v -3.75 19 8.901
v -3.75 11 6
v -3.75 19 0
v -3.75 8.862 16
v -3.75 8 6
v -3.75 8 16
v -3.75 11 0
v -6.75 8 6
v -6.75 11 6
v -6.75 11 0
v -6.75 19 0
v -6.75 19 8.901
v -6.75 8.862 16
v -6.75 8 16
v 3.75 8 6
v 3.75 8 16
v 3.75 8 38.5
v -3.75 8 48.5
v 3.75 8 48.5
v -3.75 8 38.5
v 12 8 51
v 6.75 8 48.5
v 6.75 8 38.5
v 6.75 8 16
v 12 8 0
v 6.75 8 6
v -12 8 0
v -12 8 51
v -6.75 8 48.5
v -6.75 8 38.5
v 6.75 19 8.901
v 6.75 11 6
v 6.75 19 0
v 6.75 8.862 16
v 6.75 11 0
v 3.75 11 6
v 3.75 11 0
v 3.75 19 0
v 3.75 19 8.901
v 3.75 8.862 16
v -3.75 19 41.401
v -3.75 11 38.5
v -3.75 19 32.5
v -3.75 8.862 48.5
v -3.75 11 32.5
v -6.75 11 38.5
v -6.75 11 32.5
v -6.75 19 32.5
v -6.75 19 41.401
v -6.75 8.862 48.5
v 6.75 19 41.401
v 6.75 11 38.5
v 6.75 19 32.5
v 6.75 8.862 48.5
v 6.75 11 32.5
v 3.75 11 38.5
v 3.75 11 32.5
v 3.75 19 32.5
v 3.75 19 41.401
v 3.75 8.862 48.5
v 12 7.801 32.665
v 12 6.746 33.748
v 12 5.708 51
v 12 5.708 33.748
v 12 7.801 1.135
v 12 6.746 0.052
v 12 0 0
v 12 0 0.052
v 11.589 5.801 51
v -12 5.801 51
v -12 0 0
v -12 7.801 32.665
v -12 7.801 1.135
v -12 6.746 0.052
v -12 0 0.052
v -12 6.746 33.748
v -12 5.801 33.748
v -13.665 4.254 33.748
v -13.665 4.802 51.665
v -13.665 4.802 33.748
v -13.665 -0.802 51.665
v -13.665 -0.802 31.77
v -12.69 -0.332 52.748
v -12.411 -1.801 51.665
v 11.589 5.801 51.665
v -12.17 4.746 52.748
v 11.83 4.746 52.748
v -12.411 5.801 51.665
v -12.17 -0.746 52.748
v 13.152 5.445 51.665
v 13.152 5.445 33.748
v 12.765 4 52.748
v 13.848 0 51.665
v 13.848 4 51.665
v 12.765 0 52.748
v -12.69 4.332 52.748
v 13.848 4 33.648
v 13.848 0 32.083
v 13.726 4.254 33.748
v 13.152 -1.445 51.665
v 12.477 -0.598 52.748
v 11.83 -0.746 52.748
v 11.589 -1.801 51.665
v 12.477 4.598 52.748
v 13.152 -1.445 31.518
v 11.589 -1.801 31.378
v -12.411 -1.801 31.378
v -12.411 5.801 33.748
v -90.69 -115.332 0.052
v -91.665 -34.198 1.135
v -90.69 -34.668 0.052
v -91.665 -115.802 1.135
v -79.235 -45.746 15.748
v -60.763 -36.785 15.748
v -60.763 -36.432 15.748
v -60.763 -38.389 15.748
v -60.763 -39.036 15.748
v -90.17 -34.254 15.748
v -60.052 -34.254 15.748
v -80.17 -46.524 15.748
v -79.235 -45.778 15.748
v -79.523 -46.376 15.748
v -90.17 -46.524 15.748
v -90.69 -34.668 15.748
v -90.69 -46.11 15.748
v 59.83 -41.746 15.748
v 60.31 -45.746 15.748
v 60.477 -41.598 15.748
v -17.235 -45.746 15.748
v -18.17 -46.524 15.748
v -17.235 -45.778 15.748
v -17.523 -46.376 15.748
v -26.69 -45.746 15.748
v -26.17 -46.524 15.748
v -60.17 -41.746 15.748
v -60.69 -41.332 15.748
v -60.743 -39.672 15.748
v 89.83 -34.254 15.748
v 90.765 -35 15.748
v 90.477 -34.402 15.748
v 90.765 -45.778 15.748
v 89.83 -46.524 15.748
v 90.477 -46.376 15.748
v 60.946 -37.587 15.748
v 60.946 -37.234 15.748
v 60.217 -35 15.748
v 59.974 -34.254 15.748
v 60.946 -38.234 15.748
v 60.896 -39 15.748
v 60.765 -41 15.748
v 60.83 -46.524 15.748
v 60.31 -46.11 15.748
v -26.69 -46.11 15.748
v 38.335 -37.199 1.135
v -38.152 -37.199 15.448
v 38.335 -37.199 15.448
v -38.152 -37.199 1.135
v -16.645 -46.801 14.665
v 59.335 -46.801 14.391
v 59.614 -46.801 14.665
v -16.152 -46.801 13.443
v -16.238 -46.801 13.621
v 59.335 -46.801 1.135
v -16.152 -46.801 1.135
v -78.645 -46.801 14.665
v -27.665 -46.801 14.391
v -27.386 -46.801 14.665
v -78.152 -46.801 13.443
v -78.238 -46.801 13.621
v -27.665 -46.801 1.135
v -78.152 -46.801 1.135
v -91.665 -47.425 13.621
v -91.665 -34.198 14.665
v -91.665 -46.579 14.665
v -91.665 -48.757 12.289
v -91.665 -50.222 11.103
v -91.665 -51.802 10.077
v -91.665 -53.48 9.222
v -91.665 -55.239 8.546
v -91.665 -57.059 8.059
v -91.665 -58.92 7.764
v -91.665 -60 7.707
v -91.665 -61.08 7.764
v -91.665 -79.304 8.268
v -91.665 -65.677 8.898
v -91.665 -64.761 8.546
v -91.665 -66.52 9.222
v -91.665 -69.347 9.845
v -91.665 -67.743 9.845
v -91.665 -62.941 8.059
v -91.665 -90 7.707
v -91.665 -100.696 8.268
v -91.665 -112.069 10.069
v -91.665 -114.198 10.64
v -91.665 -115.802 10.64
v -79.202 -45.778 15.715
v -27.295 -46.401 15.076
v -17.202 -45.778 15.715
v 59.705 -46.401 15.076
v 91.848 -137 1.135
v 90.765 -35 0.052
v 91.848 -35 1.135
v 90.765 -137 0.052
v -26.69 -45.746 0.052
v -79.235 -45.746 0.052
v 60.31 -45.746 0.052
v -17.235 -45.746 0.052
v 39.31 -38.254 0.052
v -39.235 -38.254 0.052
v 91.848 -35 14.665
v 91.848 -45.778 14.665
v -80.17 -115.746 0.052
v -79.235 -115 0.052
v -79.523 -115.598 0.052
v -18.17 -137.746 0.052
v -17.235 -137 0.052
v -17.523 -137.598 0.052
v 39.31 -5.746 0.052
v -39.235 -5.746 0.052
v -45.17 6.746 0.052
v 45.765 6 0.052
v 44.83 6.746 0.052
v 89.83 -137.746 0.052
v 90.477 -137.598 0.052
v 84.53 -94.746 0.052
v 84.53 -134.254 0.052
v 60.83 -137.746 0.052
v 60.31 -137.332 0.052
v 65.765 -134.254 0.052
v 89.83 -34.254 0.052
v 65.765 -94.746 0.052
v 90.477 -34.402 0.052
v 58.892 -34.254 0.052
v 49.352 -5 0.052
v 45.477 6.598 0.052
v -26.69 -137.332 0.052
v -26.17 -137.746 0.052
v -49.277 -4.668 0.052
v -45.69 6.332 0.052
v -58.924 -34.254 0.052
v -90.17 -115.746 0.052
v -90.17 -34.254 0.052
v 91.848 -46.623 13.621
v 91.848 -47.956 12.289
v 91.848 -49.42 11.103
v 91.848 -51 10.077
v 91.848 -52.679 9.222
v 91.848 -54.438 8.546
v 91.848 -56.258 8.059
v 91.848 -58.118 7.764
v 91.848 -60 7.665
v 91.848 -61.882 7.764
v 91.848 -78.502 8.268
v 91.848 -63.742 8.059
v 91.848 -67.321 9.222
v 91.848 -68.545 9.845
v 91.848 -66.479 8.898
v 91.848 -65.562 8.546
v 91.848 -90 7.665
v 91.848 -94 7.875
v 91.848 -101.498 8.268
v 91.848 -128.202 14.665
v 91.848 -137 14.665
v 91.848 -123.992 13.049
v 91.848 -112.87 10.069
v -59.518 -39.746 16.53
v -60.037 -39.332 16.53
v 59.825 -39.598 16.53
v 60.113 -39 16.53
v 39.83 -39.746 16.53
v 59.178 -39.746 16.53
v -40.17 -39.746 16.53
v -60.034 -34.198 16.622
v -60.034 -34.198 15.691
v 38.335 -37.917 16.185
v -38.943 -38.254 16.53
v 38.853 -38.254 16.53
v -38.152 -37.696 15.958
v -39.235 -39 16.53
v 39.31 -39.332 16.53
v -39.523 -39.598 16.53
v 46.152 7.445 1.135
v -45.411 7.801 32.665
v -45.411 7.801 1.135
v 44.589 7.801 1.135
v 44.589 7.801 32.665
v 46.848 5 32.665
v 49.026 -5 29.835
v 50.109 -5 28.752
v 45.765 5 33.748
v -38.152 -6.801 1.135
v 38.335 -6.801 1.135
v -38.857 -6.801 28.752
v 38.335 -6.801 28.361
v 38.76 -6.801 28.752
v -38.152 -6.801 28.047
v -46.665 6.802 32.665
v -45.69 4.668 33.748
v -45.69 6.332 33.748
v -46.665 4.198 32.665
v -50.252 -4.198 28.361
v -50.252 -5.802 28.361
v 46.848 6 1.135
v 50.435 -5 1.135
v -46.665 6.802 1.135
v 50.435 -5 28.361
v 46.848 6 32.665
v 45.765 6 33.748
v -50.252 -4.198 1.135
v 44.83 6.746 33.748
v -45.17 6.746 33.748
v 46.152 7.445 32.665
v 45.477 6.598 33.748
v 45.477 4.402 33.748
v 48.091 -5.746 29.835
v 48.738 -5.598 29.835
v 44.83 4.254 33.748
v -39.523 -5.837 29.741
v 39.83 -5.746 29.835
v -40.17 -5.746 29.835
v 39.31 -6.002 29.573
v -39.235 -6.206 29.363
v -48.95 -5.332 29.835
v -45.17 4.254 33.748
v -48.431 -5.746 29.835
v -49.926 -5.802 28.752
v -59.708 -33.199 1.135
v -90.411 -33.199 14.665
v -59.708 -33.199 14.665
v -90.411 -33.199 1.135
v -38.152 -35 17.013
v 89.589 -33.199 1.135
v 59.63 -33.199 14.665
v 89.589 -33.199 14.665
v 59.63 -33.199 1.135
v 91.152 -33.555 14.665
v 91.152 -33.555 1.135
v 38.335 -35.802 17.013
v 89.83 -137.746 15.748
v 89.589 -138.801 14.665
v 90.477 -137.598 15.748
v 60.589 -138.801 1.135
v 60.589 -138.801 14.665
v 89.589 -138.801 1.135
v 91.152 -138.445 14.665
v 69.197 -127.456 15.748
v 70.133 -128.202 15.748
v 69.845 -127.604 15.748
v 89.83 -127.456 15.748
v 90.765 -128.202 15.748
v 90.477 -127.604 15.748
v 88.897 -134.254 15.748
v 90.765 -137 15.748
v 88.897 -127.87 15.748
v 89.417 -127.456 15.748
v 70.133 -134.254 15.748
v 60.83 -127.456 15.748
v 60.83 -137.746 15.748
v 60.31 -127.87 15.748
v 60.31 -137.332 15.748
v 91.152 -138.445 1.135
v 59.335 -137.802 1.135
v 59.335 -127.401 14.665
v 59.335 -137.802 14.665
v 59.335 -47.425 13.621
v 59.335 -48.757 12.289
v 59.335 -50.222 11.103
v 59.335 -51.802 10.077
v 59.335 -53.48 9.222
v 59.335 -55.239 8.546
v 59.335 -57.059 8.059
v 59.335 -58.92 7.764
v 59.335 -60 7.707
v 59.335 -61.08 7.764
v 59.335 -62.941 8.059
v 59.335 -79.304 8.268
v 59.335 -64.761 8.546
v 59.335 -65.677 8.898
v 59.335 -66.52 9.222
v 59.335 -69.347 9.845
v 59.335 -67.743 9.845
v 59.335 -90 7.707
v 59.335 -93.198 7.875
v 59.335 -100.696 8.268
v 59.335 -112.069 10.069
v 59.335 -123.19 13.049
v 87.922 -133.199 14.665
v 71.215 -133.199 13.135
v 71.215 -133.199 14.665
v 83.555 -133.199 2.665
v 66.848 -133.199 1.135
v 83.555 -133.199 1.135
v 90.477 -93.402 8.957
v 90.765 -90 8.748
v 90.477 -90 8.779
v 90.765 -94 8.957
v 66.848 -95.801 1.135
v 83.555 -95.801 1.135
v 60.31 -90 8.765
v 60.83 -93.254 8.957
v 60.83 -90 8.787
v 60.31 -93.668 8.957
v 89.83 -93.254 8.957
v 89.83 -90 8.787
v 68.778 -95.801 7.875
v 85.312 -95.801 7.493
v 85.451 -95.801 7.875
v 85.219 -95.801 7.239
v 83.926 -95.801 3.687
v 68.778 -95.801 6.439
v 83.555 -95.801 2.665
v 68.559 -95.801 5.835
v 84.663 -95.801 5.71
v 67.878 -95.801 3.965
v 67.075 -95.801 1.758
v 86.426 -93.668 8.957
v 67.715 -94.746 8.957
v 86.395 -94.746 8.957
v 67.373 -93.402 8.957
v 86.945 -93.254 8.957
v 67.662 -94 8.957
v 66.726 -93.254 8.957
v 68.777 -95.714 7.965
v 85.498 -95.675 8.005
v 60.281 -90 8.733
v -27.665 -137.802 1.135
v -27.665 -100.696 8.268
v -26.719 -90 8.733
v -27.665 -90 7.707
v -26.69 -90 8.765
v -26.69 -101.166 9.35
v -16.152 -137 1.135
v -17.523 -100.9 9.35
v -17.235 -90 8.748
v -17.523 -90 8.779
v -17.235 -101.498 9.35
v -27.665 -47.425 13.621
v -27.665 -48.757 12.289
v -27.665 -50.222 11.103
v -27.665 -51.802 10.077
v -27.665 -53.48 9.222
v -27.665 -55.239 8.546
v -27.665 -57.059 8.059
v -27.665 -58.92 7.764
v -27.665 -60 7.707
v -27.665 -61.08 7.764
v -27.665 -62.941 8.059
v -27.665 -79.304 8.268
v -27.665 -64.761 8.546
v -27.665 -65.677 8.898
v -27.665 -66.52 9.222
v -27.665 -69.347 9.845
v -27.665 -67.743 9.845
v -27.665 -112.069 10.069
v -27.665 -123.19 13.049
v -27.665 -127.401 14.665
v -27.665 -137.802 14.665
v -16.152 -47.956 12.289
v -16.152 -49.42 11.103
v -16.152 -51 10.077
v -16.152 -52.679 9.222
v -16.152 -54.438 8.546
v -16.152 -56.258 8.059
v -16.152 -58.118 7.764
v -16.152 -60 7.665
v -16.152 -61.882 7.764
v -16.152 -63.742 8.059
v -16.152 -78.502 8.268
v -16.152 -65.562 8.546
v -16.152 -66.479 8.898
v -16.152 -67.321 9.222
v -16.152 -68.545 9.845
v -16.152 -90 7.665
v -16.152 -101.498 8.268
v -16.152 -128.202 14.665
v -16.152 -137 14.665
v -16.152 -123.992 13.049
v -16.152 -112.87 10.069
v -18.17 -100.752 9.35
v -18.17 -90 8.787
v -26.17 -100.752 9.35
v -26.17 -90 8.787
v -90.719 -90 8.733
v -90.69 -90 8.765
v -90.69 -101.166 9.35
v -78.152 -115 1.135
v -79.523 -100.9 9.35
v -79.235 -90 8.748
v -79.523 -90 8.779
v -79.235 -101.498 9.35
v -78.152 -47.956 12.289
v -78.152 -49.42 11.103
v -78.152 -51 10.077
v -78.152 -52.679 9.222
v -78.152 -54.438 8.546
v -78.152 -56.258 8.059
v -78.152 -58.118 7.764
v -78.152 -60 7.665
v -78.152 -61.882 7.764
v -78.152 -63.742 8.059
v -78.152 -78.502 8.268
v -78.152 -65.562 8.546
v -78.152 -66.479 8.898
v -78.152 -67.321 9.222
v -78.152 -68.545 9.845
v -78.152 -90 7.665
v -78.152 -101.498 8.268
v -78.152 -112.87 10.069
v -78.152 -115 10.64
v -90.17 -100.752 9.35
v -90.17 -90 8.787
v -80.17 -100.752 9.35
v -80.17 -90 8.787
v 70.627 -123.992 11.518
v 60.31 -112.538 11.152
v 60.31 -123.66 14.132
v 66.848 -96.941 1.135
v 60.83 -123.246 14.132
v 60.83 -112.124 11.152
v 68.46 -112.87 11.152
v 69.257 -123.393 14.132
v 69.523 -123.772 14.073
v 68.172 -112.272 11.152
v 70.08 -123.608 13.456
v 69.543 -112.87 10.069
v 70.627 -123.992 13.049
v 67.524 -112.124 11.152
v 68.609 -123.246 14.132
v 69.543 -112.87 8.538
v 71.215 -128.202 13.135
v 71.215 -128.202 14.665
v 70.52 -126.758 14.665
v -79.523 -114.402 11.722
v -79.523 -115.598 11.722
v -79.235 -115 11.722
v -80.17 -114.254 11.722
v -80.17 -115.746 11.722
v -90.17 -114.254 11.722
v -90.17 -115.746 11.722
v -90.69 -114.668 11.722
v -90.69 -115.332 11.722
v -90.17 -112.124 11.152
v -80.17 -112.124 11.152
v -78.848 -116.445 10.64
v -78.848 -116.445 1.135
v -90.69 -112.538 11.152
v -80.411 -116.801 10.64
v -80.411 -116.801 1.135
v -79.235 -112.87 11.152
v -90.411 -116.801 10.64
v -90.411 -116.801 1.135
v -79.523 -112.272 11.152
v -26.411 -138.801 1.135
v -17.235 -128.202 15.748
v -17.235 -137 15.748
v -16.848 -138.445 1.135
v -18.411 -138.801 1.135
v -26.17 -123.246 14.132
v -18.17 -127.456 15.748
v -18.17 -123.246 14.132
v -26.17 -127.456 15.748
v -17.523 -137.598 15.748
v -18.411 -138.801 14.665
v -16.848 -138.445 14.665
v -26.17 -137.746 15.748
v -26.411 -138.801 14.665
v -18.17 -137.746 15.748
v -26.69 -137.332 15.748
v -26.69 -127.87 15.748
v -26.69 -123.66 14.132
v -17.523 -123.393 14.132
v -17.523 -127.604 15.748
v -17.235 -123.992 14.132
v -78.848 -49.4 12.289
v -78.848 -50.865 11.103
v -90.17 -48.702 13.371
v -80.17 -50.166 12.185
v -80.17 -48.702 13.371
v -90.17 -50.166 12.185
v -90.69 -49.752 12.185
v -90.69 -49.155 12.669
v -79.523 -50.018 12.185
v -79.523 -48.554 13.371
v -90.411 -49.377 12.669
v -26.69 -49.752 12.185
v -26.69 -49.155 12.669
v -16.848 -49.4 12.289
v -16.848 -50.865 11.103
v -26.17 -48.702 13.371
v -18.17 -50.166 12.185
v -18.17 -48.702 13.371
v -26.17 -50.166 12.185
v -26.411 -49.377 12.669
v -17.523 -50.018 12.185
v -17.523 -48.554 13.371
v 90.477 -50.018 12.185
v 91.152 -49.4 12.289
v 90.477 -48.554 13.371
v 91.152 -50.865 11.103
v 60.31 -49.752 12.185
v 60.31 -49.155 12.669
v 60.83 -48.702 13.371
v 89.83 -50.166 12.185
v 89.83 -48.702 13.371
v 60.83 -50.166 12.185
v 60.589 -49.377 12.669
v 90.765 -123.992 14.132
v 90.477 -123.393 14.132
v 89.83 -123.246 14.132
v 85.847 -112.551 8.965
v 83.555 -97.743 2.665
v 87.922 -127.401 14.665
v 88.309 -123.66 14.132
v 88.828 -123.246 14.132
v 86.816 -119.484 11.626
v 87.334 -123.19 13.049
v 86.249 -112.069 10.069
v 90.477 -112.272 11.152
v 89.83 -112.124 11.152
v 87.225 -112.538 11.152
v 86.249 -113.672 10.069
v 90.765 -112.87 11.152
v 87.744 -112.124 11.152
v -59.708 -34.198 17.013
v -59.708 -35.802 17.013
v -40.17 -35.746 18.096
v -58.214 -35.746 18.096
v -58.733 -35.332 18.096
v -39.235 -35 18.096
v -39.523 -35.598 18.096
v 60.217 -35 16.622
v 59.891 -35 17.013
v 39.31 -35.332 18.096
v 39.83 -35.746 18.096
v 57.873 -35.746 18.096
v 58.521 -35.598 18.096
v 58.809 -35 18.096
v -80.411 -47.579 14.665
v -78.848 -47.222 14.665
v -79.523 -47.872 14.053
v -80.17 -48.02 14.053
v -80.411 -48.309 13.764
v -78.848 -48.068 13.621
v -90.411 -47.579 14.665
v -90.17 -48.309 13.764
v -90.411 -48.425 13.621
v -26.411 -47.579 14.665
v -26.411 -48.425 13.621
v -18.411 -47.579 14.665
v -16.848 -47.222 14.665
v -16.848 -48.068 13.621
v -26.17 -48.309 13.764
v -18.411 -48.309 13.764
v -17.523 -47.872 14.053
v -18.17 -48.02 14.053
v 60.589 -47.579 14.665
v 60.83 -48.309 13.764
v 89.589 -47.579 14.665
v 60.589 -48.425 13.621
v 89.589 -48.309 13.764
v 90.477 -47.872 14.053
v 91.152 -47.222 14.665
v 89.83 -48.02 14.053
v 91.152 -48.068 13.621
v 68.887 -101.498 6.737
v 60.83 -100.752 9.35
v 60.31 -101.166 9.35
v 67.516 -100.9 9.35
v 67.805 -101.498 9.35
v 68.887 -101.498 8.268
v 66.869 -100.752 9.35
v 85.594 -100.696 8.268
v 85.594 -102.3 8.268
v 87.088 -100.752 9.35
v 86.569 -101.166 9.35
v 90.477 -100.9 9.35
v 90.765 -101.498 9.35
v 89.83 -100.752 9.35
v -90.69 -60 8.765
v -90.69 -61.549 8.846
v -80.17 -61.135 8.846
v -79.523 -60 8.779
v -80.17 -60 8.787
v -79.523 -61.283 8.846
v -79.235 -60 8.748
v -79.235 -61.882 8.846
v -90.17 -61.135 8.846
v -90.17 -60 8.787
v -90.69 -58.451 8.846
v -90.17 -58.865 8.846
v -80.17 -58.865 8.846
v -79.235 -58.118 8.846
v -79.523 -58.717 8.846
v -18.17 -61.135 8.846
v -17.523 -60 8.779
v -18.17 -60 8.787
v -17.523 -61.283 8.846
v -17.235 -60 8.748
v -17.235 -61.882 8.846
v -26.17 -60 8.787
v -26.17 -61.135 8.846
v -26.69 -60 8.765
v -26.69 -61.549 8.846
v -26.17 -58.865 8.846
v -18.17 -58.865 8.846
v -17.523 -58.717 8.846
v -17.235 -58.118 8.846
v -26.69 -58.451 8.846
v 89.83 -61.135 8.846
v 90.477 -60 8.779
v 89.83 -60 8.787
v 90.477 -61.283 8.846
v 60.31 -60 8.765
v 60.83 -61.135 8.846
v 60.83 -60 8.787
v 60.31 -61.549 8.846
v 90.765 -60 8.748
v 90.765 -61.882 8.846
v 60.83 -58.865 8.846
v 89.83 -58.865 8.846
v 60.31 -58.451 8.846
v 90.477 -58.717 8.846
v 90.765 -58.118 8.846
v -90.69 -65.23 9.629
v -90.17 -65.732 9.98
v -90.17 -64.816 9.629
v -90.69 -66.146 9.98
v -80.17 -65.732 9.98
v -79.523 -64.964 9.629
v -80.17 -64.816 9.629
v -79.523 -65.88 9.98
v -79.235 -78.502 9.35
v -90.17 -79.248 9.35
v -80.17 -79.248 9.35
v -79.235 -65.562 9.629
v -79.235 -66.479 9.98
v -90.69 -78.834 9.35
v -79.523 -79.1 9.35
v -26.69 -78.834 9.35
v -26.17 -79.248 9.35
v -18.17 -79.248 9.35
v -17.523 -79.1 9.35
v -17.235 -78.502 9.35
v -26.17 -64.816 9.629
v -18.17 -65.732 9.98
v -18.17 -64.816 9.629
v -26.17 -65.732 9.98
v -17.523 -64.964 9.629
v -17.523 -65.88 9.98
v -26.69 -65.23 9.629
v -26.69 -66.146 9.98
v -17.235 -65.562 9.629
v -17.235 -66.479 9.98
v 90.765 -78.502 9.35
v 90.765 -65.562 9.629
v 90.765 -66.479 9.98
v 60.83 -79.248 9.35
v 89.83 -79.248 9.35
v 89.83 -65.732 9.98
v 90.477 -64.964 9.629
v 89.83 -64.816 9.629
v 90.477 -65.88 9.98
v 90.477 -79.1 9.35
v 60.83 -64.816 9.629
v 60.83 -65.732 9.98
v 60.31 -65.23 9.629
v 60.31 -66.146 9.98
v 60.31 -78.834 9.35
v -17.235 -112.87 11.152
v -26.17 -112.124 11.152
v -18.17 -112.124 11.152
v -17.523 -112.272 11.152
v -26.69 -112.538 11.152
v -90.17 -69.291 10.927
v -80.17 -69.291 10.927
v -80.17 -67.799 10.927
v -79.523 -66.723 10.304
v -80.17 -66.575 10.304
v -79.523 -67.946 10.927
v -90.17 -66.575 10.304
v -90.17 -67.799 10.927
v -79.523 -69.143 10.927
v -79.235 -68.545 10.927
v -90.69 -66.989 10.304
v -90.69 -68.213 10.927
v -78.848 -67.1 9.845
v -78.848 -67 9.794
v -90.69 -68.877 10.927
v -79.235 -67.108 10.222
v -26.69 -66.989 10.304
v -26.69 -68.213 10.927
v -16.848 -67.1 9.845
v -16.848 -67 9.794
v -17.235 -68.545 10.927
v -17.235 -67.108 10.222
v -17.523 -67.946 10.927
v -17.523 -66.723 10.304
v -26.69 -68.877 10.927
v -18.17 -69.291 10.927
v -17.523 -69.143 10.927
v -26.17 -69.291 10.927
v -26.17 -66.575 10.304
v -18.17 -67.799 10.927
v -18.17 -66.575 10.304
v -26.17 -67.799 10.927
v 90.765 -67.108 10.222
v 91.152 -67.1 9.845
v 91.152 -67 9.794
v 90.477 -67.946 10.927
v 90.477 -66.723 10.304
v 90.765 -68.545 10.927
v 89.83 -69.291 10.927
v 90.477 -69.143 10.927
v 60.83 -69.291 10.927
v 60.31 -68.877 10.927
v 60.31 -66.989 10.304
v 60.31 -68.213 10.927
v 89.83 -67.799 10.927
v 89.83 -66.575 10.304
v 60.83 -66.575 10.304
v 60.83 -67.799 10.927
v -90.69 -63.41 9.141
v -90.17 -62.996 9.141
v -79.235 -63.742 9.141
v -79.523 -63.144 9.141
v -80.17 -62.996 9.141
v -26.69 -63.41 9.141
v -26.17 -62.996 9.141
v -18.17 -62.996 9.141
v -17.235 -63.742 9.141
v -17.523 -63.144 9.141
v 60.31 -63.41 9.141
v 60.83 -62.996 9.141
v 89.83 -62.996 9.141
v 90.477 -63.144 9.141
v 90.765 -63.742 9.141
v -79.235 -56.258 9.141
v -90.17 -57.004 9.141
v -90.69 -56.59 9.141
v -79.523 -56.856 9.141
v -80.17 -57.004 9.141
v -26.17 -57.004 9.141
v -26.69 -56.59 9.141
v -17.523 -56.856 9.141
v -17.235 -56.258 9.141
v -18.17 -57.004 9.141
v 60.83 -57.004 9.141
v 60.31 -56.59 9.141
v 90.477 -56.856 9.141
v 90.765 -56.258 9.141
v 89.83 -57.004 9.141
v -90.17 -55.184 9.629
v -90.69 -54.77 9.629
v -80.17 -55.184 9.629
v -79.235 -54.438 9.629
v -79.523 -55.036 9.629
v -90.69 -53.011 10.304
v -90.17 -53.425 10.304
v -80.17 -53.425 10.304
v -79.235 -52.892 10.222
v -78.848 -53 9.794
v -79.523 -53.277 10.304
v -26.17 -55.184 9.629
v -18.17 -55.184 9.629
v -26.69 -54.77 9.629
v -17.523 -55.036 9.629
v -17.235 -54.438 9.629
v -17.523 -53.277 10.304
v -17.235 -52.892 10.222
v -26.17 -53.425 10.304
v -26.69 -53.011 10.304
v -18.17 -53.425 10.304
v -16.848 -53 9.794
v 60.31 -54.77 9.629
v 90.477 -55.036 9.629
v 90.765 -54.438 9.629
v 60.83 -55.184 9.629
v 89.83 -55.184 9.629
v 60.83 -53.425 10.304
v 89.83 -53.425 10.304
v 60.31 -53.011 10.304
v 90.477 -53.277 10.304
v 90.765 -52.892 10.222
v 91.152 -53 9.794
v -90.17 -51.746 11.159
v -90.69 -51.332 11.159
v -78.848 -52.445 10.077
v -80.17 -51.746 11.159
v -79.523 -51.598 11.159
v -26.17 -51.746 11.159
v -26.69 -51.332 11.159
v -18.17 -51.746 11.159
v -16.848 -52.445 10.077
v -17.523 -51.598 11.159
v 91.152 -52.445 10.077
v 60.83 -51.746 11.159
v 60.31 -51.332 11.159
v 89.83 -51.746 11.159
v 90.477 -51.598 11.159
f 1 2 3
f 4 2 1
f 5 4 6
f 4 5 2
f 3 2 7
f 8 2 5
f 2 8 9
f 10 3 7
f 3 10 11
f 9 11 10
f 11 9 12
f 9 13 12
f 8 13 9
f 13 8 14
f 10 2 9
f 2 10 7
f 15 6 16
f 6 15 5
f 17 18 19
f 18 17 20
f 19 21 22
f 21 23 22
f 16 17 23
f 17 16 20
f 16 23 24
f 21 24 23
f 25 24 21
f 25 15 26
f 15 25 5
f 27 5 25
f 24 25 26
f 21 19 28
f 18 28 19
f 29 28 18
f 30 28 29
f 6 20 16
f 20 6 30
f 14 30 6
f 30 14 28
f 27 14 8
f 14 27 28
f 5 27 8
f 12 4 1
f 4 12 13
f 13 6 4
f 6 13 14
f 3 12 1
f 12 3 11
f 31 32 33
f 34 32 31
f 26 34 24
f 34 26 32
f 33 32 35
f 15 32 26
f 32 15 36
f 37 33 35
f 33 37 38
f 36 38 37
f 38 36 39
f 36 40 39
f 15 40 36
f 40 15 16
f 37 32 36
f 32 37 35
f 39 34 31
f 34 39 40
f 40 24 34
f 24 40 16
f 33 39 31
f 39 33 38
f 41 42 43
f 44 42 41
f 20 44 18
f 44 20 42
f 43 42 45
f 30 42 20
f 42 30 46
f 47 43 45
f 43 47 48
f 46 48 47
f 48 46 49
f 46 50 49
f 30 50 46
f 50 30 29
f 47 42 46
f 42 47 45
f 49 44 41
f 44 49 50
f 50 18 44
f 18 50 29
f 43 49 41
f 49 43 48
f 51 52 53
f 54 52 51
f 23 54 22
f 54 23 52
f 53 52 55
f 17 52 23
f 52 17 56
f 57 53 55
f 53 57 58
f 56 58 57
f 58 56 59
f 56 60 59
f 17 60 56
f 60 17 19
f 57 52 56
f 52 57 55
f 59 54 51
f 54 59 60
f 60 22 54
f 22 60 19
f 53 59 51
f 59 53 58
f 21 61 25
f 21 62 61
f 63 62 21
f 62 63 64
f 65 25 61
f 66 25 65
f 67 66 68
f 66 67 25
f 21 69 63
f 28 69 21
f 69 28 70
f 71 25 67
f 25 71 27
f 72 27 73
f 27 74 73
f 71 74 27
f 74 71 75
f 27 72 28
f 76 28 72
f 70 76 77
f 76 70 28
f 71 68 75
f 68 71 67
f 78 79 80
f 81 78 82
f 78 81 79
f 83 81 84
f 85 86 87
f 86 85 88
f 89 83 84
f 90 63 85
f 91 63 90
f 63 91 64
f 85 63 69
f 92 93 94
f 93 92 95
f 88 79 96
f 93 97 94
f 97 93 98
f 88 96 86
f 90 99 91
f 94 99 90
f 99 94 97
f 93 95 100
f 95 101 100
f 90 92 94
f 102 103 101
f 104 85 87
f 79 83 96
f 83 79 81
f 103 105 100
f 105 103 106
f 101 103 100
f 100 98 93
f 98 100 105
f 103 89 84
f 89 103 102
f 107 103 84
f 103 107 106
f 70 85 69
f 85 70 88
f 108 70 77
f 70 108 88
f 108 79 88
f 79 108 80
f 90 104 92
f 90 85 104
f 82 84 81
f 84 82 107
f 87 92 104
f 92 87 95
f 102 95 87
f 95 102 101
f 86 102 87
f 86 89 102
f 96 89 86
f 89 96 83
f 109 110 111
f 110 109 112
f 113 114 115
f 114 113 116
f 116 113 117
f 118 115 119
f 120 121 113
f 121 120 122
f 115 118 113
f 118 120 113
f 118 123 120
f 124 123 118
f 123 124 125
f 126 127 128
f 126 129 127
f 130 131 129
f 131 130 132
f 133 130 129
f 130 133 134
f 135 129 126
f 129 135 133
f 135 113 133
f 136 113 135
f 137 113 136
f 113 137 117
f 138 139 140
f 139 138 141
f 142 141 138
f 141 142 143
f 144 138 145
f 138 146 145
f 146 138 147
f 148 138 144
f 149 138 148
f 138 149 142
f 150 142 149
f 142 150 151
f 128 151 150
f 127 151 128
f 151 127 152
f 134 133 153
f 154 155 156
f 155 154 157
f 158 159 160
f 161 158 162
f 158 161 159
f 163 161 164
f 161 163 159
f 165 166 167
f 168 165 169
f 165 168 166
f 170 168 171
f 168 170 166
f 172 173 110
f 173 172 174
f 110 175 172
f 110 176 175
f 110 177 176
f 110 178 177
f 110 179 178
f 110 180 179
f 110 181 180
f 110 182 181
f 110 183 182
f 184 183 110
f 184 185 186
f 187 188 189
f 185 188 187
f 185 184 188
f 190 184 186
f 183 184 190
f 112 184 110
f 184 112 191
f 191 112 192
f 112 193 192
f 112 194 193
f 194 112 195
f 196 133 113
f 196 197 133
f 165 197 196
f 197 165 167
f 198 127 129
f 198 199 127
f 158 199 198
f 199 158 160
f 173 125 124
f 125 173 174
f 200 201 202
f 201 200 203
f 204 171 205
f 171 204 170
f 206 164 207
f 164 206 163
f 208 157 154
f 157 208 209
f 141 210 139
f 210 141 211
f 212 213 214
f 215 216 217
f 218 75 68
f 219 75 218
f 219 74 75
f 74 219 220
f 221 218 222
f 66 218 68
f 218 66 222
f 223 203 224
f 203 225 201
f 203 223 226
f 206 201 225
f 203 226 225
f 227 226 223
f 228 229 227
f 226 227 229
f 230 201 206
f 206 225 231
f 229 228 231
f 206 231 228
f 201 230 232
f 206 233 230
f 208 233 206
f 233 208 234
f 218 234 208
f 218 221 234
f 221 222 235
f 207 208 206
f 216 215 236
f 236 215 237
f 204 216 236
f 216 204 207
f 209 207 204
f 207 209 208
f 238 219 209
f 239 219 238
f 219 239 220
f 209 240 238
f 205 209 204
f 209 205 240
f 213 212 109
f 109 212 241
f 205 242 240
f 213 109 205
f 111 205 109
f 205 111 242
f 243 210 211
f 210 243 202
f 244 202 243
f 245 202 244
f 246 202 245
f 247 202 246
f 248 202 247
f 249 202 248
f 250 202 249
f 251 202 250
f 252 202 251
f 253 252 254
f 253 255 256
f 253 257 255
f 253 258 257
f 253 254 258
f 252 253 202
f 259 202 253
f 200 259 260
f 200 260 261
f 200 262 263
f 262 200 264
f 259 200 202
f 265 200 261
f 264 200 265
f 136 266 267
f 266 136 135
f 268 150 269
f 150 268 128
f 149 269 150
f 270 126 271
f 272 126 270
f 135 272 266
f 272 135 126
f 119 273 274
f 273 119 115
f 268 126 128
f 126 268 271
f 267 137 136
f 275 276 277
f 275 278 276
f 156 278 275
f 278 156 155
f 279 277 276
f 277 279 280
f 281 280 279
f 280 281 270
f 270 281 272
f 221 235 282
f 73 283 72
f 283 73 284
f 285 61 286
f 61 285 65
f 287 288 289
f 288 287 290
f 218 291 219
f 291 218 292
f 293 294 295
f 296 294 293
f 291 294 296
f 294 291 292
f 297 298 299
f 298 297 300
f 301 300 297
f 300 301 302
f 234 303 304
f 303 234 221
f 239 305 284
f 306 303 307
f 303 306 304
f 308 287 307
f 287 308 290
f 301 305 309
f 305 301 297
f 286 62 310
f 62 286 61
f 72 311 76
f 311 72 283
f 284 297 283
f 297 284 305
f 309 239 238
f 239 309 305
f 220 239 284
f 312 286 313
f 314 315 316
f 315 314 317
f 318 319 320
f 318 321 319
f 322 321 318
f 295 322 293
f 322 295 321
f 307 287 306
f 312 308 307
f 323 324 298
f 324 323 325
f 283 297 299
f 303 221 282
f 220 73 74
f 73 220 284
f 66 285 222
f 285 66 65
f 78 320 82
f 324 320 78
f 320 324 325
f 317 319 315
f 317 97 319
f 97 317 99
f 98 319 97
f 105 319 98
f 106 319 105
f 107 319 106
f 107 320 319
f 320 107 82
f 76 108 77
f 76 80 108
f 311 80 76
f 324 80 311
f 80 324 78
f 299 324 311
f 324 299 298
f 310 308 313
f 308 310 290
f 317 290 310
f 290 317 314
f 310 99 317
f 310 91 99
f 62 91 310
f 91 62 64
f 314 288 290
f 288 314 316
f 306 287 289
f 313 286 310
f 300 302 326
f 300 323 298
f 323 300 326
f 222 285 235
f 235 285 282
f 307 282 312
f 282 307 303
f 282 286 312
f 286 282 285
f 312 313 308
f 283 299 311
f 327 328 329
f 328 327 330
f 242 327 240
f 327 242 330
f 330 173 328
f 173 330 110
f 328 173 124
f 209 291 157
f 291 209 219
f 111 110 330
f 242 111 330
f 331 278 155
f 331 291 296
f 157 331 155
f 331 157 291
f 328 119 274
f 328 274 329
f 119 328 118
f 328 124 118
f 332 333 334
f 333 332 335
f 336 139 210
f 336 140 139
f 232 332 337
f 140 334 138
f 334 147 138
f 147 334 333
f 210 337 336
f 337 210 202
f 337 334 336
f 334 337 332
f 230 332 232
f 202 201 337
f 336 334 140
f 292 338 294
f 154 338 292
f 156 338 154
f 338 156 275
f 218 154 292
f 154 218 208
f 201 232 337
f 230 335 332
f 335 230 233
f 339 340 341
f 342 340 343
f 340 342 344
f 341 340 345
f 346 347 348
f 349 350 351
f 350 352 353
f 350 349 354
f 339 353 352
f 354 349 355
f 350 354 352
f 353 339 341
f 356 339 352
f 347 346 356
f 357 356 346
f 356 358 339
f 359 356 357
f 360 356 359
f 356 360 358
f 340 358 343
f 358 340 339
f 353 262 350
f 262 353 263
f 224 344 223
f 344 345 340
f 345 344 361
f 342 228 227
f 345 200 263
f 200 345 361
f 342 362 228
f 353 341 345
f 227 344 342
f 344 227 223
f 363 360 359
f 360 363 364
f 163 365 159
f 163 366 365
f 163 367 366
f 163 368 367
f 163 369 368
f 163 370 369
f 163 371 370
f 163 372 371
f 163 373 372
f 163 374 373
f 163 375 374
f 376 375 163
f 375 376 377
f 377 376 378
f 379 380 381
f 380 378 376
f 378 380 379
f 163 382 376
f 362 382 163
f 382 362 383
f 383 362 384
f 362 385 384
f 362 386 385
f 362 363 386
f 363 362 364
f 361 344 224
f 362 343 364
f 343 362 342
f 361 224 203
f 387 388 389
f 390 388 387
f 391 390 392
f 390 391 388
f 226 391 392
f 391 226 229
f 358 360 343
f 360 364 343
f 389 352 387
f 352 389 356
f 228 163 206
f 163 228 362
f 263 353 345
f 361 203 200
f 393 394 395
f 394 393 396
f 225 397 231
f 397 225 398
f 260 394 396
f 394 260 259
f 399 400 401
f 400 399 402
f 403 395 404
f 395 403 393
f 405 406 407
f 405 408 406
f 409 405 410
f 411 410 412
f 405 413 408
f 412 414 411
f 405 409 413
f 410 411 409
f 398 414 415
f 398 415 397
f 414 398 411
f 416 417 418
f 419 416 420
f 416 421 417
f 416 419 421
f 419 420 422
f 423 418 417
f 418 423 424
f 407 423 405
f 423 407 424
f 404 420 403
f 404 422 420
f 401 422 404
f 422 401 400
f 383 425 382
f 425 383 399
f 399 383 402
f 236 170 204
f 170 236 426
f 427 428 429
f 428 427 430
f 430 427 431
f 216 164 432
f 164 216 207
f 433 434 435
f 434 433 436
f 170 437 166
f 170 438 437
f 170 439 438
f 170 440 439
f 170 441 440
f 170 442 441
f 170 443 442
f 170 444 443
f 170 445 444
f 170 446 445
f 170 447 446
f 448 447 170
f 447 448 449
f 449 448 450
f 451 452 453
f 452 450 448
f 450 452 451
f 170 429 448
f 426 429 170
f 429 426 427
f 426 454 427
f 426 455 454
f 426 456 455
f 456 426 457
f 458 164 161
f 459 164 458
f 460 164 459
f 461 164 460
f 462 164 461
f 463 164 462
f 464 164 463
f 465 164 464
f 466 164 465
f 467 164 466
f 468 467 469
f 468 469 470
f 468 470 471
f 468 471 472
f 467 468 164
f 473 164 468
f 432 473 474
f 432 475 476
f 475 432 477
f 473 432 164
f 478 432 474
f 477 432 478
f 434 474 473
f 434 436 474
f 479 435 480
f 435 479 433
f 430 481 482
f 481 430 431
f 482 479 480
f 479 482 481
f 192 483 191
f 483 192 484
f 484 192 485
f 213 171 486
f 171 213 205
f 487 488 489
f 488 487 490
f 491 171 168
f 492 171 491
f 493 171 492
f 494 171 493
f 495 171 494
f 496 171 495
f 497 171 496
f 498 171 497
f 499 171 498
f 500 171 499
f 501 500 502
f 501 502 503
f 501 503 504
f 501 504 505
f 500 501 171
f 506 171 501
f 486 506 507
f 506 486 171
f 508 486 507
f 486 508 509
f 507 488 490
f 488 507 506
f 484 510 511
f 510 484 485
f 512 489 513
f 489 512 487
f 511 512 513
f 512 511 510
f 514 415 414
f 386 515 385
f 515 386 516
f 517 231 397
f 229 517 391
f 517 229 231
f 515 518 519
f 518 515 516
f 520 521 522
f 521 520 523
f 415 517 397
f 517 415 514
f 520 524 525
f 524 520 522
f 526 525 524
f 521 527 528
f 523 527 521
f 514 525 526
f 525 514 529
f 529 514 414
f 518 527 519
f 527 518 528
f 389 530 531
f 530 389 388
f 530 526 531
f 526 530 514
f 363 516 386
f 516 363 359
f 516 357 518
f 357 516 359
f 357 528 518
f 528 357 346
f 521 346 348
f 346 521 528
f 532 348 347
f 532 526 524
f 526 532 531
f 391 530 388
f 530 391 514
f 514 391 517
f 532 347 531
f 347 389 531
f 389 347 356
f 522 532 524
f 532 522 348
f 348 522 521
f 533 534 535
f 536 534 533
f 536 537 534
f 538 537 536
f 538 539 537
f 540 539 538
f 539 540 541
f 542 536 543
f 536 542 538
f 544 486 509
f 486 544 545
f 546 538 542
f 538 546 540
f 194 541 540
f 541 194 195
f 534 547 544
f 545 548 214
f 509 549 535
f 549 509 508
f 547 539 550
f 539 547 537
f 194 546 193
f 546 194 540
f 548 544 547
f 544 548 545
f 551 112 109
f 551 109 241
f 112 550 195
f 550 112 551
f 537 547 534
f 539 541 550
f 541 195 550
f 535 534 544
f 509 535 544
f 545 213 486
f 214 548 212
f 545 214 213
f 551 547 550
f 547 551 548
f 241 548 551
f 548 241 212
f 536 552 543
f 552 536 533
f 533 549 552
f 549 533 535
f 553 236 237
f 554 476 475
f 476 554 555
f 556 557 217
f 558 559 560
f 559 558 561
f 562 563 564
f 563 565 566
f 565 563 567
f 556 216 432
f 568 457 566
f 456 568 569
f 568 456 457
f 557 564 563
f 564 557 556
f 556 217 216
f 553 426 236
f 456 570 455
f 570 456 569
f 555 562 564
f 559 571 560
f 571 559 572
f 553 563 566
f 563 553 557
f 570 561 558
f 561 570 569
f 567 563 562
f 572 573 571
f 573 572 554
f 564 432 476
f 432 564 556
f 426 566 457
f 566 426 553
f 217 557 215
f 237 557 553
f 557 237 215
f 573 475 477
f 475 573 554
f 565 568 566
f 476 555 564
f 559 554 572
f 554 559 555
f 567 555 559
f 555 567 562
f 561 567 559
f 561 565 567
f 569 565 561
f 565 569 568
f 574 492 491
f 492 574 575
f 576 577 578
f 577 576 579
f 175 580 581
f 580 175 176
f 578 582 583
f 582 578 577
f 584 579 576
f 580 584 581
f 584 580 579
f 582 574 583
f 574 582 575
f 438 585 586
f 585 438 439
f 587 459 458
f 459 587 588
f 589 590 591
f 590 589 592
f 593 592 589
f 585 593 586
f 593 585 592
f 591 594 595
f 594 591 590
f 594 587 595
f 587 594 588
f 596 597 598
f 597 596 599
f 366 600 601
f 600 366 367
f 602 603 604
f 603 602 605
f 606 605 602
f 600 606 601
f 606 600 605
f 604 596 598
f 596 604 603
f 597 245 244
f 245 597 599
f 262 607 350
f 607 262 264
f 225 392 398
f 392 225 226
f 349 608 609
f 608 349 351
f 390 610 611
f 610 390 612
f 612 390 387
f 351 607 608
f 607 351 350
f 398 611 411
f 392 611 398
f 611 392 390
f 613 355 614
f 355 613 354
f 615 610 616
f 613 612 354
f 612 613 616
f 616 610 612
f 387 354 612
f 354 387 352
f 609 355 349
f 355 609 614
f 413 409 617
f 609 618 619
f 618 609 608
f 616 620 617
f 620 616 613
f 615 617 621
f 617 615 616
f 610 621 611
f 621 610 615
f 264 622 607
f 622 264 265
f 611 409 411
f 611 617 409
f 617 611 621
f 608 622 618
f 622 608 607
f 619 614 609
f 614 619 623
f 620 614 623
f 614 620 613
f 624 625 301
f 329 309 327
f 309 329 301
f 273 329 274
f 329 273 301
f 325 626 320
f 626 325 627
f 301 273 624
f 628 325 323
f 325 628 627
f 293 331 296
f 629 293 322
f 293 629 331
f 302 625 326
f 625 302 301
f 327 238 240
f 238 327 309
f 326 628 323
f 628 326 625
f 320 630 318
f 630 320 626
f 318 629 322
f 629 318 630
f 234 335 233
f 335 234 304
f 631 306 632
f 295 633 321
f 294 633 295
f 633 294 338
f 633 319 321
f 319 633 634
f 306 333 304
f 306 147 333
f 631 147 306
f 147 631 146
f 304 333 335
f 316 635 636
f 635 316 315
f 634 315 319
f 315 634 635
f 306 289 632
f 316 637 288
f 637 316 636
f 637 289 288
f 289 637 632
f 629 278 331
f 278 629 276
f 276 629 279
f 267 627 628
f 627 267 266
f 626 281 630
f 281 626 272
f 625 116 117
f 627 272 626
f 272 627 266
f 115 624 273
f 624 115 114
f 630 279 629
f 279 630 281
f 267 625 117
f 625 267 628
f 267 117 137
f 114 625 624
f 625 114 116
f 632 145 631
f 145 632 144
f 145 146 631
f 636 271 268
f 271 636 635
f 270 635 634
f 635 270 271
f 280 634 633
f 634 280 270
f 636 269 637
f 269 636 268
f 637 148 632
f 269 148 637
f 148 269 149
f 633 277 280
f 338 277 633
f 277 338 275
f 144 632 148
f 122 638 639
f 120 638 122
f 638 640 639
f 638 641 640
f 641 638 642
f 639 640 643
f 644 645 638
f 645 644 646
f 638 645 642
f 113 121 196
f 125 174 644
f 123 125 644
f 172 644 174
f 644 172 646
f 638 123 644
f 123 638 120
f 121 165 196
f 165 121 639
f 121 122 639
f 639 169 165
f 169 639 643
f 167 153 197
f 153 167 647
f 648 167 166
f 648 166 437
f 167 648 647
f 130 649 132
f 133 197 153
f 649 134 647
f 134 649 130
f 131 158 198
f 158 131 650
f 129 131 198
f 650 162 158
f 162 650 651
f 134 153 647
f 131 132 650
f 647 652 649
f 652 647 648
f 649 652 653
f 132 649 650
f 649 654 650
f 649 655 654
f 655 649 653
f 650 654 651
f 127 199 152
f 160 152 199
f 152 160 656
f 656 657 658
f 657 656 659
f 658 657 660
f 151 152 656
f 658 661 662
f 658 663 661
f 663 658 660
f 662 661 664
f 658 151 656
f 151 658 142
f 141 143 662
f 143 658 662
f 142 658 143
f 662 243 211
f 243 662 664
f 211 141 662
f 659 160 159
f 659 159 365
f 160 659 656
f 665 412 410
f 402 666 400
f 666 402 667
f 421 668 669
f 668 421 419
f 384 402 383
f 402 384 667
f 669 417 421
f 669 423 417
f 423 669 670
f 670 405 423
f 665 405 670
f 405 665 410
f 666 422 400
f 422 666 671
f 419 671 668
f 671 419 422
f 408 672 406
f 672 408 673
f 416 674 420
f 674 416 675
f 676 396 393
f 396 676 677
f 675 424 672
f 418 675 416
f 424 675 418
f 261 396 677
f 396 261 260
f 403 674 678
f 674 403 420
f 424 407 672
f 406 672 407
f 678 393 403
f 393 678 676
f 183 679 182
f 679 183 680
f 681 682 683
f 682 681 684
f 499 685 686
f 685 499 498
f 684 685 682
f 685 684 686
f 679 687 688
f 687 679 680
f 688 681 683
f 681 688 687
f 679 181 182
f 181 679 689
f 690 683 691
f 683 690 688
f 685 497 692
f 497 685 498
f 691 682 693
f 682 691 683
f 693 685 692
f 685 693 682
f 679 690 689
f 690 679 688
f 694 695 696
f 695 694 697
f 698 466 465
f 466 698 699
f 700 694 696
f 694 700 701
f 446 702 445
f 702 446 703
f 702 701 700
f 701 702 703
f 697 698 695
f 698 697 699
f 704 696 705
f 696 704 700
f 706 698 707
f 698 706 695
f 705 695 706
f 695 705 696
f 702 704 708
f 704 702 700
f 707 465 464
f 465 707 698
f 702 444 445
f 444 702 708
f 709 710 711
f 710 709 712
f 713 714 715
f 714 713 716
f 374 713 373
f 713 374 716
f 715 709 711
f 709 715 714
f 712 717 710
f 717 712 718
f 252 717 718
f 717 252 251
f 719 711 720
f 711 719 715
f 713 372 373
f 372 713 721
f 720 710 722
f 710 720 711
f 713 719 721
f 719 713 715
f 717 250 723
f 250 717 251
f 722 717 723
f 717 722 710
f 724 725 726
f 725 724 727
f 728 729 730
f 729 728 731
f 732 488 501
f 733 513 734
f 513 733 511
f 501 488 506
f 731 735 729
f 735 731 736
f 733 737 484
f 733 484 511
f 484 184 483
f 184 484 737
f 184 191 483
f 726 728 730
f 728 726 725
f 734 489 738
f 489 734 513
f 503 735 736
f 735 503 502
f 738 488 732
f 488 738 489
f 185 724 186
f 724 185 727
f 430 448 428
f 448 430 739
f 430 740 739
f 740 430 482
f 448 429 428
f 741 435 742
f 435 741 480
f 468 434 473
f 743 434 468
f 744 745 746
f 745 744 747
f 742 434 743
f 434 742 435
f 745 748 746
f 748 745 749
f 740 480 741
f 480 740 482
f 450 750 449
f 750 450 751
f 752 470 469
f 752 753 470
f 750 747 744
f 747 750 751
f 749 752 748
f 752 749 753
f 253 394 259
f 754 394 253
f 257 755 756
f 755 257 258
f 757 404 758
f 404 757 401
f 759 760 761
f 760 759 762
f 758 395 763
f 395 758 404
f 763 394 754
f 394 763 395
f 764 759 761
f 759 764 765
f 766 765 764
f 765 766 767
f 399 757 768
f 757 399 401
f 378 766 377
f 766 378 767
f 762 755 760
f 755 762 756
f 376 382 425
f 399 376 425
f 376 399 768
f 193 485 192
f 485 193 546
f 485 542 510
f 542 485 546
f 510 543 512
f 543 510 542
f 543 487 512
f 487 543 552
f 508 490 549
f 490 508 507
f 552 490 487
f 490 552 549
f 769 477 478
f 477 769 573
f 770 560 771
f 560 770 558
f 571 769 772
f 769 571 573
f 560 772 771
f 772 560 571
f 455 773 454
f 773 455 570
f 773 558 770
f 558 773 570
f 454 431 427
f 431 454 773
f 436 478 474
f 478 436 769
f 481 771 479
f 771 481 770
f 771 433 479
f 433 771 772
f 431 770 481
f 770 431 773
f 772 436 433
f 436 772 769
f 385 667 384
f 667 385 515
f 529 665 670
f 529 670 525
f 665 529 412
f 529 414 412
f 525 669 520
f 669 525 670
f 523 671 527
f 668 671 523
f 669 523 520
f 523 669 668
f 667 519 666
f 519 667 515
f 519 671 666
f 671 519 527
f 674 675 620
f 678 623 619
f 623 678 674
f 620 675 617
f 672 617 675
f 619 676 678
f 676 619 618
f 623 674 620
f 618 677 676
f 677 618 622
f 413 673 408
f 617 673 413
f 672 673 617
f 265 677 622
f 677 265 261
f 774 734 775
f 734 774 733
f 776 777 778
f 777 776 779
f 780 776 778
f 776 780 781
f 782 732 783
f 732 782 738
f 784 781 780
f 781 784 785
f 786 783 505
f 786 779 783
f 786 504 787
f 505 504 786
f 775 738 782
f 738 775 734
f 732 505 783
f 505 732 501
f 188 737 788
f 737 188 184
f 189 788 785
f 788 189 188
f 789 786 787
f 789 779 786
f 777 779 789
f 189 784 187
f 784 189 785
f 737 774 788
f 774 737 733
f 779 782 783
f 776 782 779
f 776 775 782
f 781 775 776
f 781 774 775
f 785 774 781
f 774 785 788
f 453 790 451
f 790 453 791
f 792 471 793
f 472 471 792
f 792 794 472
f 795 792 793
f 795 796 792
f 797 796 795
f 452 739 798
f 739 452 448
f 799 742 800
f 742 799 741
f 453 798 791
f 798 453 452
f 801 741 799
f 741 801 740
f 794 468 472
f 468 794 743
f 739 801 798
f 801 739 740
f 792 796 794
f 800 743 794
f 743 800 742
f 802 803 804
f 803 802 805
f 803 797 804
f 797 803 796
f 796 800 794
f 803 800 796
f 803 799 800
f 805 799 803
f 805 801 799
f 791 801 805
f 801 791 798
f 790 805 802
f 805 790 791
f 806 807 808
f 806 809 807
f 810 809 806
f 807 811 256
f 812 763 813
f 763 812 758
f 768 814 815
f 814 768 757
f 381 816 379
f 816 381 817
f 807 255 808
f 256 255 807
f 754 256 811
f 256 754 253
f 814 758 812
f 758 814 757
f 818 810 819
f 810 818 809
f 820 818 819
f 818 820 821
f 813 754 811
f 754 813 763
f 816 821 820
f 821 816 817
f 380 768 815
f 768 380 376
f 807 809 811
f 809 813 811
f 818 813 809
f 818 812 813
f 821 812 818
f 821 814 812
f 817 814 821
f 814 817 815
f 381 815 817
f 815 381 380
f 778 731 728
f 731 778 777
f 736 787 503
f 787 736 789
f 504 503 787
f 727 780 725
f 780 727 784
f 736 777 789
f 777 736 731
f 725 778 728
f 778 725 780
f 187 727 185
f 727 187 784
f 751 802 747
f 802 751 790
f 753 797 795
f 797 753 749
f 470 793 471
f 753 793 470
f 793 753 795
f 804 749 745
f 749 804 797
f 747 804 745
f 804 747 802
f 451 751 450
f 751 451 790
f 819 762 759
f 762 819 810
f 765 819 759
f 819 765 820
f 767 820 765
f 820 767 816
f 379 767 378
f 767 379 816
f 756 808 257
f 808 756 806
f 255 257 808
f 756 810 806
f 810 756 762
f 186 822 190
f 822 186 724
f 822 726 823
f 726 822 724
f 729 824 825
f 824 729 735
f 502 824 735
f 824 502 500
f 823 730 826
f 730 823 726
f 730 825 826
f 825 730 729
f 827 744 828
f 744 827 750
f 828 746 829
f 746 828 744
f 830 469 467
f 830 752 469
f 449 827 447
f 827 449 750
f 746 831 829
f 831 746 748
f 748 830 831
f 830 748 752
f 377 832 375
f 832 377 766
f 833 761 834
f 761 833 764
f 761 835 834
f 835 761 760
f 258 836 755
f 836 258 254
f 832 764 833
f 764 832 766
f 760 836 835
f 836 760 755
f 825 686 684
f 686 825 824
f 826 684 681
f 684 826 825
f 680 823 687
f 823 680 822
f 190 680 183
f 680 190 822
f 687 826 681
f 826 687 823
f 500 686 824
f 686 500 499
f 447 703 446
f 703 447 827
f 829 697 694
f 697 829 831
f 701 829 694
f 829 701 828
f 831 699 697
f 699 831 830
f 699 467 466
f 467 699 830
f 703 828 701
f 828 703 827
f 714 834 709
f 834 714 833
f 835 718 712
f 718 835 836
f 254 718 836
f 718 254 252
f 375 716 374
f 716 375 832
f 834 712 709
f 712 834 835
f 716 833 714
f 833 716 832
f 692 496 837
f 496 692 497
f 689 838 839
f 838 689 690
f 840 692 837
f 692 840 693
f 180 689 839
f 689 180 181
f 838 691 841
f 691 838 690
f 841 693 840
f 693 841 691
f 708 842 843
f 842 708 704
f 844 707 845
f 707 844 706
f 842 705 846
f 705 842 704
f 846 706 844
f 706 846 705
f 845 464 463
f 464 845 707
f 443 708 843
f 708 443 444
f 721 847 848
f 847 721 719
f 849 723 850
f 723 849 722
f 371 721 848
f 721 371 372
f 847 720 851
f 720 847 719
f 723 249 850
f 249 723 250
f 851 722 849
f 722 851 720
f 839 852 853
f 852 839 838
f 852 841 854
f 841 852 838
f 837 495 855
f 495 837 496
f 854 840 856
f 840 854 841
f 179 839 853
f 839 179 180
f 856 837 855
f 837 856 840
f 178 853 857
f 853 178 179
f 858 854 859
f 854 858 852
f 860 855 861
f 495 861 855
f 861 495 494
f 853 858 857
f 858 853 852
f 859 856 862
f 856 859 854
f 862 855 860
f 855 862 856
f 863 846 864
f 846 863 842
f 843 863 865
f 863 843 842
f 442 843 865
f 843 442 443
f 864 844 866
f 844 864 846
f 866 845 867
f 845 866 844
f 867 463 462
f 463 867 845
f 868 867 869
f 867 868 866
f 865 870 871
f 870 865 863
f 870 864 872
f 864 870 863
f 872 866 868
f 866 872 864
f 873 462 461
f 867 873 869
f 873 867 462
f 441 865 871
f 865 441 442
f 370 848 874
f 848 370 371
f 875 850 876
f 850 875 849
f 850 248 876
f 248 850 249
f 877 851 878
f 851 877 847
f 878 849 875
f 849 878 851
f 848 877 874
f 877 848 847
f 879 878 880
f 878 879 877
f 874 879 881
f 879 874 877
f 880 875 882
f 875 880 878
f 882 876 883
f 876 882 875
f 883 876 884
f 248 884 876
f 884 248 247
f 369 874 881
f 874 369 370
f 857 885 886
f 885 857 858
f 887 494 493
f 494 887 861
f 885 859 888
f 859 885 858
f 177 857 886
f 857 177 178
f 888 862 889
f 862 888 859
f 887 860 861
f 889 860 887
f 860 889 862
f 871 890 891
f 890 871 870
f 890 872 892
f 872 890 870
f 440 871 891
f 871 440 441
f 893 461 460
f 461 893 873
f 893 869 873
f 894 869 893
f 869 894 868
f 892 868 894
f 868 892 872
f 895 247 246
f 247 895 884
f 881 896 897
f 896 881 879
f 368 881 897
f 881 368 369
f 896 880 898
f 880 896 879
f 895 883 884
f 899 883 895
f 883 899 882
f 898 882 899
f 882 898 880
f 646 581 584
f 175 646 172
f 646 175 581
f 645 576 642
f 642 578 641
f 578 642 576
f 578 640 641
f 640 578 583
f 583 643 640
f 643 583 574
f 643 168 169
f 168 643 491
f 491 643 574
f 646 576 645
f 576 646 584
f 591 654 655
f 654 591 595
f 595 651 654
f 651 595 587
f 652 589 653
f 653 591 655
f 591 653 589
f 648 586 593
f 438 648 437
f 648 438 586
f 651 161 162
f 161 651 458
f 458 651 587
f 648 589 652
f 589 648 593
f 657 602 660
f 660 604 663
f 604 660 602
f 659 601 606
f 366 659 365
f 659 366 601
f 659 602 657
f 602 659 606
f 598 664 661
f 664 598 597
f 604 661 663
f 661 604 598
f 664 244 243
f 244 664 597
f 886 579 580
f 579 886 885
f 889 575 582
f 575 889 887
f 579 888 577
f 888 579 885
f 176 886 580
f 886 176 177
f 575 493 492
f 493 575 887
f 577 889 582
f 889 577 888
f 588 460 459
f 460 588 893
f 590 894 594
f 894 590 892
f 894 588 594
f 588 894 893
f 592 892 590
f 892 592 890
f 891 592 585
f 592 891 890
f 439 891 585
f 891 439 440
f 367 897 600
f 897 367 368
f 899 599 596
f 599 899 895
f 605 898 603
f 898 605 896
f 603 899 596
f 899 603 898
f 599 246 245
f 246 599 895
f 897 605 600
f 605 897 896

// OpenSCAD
w=3.2-0.2;//3.2-0.1;
h=18-1-1;
d=32.5;
//2.73


// Single "tooth" hook of Elfa attachment
module tooth() {
  difference() {
    cube([w, 11, h]);
    union() {
      cube([w, 2.5+0.5, 6]);  // 2.5+1
      translate([0, 20-2, 4])
        rotate([55, 0, 0])
          cube([w, 40, 40]);
    }
  }
}


// Complete attachment, with 4 teeth
module connector() {
  translate([-24/2, 0, 0]) {
  cube([24, 8, 51]);
  translate([(24-w-10.5)/2, 8, 0])
    tooth();
  translate([(24-w-10.5)/2+10.5, 8, 0])
    tooth();
  translate([(24-w-10.5)/2, 8, d])
    tooth();
  translate([(24-w-10.5)/2+10.5, 8, d])
    tooth();
  }
}

softenR = 2;
DiaV = 75+2*softenR ;



connector();
translate([0, 0, softenR-0.1])
minkowski() {
  difference() {
    union() {
      translate([-24/2, 0, 0]) cube([24, 4, 51-softenR]);
      
      hull() {
        translate([-90/2, 5, 0]) cube([90, 1, 30]);
        translate([-120/2, -38-5+2, 0]) cube([120, 1, 12]);
      }
      translate([0, -37+2, 0])
        difference() {
          // Main body
          translate([-180/2, -72-30, 0]) cube([180, 72+30, 12]);
          union() {
            translate([-18, -76-10-30, 0]) cube([75+softenR*2, 76+30, 20]);  
            translate([-80, -76-10-30, 0]) cube([50+softenR*2, 76+30, 20]);  
            translate([-100, -76-10-30-70, 0]) cube([50+softenR*2, 76+30, 20]);  
            // Cut for power adapter
            translate([+65, -70-30, 0]) 
              rotate([0, 20, 0])
                cube([15+softenR*2, 37+softenR*2, 50]);  
          }
        }
    }
    union() {
      // Cut for additional blade
      translate([-(76+softenR*2)/2, -30-7-5+3, 0]) cube([76+softenR*2, 30+softenR*2, 50]);       
      // Upper surface
      translate([-100, -75-15, 105+10])
        rotate([0, 90, 0])
          cylinder(r1=110, r2=110, $fn=60, h=200);     
      translate([-100, -55-3-2, 25-8+5+1])
        rotate([0, 90, 0])
          cylinder(r1=17+1, r2=17+1, $fn=60, h=200);     
    }
  }
  sphere(r=softenR, center=true);
}

      //translate([-80, -75, 110])
      //  rotate([0, 90, 0])
        //  cylinder(r1=100, r2=100, $fn=60, h=200);

/*
translate([-160/2, -10, 0])
  cube([160, 10, 15]);
translate([-160/2, -60, 0])
  cube([15, 60, 15]);
translate([-15/2, -60, 0])
  cube([15, 60, 15]);
translate([160/2-15, -60, 0])
  cube([15, 60, 15]);
*/
/*
translate([0, -(DiaV/2+15)+7-softenR, softenR]) {
  minkowski() {
    difference() {
      cylinder(h=15, r1=DiaV/2+15, r2=DiaV/2+15, center=false, $fn=60);
      union() {
        cylinder(h=15, r1=DiaV/2, r2=DiaV/2, center=false, $fn=60);
        translate([-200/2, -(100+15), 0])
          cube([200, 100, 30], center=false);
      }
    }
    sphere(r=softenR, center=true);
  }
}
*/
